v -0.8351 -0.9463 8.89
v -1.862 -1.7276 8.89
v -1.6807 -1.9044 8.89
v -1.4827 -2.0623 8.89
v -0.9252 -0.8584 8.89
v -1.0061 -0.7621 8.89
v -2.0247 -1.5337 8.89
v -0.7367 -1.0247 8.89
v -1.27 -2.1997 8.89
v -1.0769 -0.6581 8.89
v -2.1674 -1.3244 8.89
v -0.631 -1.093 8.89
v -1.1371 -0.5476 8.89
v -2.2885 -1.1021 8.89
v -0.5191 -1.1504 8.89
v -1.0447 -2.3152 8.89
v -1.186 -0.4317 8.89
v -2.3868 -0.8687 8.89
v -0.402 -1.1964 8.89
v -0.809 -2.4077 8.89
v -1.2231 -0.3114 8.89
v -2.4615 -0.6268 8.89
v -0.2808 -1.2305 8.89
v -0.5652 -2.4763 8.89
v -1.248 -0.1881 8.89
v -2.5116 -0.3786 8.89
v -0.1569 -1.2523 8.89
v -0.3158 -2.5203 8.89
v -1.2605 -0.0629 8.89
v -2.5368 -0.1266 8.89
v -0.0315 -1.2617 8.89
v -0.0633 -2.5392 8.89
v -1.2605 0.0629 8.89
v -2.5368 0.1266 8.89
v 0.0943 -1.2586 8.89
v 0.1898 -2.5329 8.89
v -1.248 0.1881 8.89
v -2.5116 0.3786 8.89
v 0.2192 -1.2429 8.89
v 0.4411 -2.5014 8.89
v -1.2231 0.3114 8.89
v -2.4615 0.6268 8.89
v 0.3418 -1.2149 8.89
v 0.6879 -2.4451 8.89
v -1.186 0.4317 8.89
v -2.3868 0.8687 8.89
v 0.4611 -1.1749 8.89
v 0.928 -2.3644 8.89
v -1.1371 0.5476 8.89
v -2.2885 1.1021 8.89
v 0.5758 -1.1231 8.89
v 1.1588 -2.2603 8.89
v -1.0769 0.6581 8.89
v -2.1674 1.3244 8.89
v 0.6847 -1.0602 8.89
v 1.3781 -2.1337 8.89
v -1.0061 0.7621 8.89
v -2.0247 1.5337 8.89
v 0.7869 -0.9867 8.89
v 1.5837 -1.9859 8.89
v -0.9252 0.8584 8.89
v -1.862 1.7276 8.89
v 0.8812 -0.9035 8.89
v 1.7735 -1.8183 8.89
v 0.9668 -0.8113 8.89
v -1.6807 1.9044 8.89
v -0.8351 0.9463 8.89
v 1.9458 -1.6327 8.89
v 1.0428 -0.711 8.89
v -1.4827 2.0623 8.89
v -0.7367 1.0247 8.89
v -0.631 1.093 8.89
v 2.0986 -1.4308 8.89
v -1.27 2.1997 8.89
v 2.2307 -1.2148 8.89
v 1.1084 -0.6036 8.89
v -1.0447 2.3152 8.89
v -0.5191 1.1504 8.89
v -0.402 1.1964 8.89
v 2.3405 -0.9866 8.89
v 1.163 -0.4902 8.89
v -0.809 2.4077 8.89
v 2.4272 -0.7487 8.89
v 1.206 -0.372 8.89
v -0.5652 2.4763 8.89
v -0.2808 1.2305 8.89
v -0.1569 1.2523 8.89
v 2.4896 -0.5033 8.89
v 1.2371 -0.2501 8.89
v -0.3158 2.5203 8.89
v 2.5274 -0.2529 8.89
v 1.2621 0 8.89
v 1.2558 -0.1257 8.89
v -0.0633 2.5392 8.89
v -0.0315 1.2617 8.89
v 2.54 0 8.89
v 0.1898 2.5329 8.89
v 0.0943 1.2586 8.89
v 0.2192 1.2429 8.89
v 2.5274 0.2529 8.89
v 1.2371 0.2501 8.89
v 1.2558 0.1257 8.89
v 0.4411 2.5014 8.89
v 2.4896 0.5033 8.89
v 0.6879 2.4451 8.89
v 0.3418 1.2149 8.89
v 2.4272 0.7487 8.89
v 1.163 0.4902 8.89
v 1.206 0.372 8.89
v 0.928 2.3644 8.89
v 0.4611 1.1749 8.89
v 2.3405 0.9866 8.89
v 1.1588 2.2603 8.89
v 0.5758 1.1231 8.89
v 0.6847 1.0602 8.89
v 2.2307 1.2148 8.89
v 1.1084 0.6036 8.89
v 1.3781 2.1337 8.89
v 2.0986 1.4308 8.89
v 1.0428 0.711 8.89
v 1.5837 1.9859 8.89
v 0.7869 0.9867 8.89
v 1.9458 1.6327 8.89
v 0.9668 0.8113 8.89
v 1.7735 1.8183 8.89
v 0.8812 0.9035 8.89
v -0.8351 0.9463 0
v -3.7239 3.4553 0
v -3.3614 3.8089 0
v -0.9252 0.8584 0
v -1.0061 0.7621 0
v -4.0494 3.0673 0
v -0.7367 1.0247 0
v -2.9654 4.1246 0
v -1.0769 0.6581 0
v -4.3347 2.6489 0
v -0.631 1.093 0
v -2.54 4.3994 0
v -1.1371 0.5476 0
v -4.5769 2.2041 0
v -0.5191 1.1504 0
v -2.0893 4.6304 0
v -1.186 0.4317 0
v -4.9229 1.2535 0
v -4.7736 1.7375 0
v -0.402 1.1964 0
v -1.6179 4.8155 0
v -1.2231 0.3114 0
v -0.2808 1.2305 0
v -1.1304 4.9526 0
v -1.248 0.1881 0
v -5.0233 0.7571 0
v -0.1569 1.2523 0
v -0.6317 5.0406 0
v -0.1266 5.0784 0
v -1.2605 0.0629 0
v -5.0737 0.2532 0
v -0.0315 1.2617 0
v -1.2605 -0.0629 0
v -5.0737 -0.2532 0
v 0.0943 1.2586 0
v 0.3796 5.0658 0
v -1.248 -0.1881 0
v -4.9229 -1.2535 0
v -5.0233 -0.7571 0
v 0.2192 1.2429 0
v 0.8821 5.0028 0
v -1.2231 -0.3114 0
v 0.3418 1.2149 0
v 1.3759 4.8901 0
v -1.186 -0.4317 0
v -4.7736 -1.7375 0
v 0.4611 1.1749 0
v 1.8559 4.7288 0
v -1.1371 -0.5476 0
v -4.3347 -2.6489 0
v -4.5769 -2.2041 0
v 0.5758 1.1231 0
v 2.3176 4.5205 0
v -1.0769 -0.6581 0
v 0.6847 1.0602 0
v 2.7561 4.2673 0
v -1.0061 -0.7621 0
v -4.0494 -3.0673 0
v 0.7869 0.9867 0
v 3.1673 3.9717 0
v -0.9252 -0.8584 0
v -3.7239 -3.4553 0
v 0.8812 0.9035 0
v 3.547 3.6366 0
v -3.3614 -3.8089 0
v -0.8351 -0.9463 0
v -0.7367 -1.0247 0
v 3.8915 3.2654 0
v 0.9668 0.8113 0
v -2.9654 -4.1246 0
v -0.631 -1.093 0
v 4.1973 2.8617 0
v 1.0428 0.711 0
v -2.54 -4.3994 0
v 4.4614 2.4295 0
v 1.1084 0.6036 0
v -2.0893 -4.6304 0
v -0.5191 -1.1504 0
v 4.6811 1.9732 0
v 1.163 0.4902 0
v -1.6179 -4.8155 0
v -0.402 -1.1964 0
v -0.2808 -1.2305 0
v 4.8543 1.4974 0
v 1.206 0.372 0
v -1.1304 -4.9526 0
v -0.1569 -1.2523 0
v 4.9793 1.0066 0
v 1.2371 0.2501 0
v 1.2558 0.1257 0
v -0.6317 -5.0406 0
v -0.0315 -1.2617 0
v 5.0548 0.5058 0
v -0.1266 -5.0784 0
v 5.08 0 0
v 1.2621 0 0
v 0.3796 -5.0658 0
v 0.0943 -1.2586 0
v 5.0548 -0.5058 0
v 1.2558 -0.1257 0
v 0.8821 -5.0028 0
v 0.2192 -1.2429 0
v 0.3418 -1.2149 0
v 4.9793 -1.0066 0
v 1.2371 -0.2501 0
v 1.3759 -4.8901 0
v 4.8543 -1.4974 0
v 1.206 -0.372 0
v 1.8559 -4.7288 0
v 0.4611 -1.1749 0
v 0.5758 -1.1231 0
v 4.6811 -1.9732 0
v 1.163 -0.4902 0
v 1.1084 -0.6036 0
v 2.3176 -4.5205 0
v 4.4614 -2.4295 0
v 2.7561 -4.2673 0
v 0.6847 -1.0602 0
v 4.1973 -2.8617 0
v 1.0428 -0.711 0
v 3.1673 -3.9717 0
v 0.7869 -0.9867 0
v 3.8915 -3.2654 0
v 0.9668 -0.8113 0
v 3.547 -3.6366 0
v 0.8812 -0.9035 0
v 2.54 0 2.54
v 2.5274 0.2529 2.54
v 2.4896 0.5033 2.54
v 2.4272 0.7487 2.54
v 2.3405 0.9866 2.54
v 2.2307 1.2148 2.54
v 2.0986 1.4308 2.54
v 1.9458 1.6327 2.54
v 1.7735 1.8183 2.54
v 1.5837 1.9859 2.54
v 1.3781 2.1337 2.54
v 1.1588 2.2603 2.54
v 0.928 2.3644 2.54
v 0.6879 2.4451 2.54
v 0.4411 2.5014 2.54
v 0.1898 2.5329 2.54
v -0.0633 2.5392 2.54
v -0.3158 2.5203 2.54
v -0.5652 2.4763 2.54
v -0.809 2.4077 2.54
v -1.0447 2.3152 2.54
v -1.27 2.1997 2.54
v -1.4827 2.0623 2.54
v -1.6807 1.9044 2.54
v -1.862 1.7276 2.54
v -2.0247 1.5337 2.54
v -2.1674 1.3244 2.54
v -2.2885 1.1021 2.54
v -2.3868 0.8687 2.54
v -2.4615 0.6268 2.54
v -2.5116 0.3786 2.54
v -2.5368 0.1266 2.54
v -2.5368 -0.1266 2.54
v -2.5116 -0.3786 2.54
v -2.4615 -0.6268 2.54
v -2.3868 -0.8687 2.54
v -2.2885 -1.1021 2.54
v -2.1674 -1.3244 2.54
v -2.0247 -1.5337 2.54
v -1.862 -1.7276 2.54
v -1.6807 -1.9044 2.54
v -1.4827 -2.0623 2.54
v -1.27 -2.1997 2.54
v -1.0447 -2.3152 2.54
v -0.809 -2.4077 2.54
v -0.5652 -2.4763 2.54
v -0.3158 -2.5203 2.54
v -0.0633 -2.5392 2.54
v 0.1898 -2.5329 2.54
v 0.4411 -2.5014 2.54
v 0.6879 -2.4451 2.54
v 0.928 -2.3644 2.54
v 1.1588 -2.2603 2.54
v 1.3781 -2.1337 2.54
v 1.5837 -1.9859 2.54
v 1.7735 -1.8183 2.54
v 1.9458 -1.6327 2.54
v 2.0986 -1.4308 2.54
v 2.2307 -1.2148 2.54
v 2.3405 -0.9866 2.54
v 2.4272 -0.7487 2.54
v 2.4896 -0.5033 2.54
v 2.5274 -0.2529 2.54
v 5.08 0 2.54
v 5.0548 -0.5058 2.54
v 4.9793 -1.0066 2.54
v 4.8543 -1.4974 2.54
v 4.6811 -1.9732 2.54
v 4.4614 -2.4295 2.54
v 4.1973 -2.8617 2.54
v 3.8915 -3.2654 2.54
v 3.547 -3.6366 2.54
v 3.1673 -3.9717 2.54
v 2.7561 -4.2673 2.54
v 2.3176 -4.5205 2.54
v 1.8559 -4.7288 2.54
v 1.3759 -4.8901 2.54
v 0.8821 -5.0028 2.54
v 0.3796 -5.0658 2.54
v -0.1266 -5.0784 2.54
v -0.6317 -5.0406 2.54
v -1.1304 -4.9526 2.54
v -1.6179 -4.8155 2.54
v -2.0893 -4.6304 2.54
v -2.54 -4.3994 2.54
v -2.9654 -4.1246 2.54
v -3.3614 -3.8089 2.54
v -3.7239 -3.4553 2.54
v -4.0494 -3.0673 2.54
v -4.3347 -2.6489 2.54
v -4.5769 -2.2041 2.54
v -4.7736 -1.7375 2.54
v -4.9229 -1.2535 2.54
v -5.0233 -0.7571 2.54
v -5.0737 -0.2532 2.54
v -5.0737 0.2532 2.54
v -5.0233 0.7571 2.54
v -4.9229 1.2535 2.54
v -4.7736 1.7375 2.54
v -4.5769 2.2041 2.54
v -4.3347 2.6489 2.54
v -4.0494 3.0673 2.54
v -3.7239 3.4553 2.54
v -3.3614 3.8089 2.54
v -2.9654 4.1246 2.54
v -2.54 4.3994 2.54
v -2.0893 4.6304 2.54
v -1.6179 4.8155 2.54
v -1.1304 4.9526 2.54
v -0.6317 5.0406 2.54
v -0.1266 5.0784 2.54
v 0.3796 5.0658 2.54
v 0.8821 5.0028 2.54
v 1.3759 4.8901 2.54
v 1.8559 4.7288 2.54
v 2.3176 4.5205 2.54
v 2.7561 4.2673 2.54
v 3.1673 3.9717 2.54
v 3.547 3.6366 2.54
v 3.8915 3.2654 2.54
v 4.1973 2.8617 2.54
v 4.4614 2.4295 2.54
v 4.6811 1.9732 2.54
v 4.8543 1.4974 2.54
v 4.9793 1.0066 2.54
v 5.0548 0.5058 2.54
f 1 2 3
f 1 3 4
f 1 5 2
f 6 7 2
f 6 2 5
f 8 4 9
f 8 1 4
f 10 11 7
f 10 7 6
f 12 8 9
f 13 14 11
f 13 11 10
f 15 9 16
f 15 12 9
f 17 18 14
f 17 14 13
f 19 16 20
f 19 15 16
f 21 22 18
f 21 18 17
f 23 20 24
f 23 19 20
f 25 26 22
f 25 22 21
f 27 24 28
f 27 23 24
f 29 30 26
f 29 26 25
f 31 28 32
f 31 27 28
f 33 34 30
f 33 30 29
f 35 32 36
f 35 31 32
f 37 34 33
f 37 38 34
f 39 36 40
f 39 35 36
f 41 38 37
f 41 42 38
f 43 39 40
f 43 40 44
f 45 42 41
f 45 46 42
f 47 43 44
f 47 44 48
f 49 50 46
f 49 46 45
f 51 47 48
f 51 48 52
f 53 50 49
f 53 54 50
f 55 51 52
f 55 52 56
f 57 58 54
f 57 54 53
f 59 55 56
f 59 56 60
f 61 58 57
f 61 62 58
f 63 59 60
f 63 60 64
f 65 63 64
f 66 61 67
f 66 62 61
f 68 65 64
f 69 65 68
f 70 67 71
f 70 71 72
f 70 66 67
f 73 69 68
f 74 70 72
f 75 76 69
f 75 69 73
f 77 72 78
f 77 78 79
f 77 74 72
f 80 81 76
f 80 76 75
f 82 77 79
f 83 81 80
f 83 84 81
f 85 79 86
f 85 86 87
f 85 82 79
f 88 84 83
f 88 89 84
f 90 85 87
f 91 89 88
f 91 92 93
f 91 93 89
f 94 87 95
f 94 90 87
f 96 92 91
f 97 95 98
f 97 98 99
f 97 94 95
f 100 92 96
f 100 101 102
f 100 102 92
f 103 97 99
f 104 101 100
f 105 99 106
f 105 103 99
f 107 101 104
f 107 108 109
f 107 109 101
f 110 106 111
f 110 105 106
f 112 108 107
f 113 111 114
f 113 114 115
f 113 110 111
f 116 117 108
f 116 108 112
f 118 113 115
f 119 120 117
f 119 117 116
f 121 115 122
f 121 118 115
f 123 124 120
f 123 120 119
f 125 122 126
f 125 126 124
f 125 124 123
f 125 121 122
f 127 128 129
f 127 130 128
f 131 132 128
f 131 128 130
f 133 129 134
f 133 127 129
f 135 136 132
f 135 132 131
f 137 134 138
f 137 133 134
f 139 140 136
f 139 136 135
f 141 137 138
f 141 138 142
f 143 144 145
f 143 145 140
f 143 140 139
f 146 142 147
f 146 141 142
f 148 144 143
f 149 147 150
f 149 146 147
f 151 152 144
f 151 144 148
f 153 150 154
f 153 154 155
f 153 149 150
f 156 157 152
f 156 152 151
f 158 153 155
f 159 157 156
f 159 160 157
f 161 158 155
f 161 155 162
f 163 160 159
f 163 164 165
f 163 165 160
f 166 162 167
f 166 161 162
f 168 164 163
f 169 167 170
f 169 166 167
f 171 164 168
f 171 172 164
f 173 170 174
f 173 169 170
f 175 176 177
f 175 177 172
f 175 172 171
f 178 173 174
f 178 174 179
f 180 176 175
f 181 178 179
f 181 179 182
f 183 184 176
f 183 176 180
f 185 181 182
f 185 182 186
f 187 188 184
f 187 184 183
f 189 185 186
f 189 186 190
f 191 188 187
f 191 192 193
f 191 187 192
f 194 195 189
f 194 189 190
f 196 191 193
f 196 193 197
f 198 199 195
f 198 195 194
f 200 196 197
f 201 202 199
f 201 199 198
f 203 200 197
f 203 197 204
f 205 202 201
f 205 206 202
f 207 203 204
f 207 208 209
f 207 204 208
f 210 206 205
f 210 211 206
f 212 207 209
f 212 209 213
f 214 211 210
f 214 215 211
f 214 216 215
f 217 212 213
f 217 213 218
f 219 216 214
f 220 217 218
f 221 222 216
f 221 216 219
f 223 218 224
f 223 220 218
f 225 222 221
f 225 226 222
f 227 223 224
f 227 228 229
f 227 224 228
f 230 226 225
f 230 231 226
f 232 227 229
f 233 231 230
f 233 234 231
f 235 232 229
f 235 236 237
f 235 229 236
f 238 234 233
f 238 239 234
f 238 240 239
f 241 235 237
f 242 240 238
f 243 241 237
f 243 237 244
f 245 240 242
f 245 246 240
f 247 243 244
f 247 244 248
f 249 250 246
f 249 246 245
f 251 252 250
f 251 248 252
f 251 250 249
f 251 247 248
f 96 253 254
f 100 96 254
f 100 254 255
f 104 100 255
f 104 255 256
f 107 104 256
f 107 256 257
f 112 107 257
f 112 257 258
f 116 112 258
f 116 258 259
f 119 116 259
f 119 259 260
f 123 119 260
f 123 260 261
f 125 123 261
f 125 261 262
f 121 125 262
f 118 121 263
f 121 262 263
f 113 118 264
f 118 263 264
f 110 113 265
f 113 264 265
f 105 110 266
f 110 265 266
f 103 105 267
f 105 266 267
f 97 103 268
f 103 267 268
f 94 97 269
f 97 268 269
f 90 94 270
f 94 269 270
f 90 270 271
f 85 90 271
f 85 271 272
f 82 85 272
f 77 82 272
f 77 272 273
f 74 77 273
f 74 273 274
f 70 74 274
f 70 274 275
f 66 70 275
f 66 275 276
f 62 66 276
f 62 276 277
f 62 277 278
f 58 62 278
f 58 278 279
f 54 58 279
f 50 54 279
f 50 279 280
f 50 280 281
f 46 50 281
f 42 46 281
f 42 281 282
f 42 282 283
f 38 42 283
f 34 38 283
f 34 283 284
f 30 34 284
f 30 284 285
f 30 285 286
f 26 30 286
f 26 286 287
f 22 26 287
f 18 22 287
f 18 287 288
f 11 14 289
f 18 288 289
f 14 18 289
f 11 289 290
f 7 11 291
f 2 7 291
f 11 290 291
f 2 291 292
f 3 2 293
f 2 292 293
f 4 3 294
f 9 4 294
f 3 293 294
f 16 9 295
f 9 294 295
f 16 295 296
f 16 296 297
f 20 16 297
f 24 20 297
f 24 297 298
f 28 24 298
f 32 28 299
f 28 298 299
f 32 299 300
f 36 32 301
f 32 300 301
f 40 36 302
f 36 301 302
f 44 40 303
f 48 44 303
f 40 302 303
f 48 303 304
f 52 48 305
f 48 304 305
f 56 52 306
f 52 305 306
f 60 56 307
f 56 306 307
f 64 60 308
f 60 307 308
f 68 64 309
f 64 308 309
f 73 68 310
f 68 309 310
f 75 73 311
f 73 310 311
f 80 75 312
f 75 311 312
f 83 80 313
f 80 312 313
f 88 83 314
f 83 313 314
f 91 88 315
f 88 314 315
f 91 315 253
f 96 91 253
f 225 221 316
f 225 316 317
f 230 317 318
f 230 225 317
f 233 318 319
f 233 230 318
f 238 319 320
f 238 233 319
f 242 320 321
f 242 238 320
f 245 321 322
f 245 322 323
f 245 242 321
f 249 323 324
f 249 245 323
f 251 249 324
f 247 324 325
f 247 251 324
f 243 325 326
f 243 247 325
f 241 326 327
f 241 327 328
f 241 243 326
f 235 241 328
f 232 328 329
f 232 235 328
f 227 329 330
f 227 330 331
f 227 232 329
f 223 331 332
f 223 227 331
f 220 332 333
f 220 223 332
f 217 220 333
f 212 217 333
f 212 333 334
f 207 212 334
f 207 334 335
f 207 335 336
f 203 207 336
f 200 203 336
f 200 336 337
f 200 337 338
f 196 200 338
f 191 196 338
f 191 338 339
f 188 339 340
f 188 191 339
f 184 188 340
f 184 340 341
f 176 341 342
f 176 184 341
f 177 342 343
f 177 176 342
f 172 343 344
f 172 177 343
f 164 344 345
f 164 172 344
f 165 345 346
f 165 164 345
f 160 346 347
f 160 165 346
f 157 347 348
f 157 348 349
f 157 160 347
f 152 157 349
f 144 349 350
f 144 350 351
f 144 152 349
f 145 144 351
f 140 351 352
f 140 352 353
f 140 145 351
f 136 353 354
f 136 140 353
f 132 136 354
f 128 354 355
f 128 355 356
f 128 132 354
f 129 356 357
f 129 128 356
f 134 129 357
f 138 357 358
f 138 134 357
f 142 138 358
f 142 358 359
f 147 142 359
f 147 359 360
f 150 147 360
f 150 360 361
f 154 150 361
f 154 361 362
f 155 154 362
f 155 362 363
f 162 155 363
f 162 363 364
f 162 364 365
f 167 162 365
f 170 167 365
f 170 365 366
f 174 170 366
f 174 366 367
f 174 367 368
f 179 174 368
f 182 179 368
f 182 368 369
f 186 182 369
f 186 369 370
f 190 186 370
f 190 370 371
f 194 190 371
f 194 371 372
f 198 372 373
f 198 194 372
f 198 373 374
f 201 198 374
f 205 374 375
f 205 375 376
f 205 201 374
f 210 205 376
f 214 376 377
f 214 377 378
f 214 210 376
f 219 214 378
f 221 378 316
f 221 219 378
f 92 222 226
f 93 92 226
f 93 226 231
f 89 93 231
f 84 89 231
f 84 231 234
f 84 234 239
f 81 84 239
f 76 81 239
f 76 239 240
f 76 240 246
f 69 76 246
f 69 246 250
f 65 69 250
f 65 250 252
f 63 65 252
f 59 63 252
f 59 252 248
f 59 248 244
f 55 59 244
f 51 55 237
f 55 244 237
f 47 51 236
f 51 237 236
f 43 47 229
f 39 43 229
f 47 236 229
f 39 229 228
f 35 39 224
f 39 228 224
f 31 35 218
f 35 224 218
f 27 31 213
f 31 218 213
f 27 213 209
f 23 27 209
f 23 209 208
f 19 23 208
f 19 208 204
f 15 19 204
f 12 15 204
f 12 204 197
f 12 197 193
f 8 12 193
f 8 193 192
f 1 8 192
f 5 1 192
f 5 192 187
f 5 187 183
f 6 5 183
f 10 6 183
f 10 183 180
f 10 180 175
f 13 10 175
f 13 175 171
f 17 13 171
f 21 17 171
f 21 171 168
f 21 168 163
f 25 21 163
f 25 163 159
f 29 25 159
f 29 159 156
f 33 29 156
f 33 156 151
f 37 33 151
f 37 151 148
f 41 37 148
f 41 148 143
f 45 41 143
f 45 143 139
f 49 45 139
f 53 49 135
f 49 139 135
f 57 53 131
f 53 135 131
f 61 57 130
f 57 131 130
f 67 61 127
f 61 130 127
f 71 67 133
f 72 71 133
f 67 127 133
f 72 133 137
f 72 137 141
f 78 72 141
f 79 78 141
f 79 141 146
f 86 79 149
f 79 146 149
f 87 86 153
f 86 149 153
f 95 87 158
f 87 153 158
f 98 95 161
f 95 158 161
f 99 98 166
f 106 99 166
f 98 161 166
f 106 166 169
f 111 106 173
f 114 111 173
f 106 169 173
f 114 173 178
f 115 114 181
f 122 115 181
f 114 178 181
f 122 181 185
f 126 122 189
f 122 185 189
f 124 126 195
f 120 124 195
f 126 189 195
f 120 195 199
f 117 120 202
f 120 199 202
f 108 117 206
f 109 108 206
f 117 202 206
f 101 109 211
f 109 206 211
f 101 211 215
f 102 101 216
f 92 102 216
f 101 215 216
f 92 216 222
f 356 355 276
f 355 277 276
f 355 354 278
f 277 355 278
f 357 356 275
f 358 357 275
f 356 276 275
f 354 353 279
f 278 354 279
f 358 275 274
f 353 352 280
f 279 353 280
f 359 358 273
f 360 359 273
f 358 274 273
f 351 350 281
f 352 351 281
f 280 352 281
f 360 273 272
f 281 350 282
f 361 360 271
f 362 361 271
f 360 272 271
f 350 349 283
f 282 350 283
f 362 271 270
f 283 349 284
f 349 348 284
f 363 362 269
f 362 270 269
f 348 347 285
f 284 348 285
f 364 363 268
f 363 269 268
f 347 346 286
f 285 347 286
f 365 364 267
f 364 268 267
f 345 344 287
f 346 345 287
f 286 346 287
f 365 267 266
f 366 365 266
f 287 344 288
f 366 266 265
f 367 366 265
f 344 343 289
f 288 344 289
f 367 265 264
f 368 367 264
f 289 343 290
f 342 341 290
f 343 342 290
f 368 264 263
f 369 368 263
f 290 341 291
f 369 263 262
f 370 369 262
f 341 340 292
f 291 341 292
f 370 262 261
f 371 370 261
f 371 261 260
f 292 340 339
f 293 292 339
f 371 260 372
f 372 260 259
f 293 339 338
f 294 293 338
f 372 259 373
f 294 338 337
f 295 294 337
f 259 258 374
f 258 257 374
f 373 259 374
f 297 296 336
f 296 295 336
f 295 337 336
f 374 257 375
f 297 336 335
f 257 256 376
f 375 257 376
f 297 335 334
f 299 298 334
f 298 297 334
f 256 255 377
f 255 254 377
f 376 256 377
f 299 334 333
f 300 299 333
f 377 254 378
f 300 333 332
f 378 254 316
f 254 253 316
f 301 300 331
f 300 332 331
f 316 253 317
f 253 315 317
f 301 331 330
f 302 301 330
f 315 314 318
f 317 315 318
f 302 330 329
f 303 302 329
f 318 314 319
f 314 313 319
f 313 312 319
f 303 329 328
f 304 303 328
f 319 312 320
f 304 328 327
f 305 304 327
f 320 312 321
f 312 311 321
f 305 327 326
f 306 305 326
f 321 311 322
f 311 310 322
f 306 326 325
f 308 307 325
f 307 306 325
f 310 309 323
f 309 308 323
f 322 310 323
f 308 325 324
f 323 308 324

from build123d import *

# Parameters (mm, degrees)
F0_R     = 2.54
F1_DEPTH = 8.89
F2_R     = 5.08
F2_R_2   = 2.54
F3_DEPTH = 2.54
F4_R     = 1.262095
F5_DEPTH = 25.4


with BuildPart() as f1:
    # F0 (on Top) → F1 (new body)
    with BuildSketch(Plane.XY):
        Circle(F0_R)
    extrude(amount=F1_DEPTH)

    # F2 (on face) → F3 (join)
    with BuildSketch(Plane(origin=(0, 0, 0), x_dir=(1, 0, 0), z_dir=(0, 0, -1))):
        Circle(F2_R)
        Circle(F2_R_2, mode=Mode.SUBTRACT)
    extrude(amount=-F3_DEPTH)

    # F4 (on face) → F5 (cut)
    with BuildSketch(Plane(origin=(0, 0, 0), x_dir=(1, 0, 0), z_dir=(0, 0, -1))):
        Circle(F4_R)
    extrude(amount=-F5_DEPTH, mode=Mode.SUBTRACT)


solid = f1.part
